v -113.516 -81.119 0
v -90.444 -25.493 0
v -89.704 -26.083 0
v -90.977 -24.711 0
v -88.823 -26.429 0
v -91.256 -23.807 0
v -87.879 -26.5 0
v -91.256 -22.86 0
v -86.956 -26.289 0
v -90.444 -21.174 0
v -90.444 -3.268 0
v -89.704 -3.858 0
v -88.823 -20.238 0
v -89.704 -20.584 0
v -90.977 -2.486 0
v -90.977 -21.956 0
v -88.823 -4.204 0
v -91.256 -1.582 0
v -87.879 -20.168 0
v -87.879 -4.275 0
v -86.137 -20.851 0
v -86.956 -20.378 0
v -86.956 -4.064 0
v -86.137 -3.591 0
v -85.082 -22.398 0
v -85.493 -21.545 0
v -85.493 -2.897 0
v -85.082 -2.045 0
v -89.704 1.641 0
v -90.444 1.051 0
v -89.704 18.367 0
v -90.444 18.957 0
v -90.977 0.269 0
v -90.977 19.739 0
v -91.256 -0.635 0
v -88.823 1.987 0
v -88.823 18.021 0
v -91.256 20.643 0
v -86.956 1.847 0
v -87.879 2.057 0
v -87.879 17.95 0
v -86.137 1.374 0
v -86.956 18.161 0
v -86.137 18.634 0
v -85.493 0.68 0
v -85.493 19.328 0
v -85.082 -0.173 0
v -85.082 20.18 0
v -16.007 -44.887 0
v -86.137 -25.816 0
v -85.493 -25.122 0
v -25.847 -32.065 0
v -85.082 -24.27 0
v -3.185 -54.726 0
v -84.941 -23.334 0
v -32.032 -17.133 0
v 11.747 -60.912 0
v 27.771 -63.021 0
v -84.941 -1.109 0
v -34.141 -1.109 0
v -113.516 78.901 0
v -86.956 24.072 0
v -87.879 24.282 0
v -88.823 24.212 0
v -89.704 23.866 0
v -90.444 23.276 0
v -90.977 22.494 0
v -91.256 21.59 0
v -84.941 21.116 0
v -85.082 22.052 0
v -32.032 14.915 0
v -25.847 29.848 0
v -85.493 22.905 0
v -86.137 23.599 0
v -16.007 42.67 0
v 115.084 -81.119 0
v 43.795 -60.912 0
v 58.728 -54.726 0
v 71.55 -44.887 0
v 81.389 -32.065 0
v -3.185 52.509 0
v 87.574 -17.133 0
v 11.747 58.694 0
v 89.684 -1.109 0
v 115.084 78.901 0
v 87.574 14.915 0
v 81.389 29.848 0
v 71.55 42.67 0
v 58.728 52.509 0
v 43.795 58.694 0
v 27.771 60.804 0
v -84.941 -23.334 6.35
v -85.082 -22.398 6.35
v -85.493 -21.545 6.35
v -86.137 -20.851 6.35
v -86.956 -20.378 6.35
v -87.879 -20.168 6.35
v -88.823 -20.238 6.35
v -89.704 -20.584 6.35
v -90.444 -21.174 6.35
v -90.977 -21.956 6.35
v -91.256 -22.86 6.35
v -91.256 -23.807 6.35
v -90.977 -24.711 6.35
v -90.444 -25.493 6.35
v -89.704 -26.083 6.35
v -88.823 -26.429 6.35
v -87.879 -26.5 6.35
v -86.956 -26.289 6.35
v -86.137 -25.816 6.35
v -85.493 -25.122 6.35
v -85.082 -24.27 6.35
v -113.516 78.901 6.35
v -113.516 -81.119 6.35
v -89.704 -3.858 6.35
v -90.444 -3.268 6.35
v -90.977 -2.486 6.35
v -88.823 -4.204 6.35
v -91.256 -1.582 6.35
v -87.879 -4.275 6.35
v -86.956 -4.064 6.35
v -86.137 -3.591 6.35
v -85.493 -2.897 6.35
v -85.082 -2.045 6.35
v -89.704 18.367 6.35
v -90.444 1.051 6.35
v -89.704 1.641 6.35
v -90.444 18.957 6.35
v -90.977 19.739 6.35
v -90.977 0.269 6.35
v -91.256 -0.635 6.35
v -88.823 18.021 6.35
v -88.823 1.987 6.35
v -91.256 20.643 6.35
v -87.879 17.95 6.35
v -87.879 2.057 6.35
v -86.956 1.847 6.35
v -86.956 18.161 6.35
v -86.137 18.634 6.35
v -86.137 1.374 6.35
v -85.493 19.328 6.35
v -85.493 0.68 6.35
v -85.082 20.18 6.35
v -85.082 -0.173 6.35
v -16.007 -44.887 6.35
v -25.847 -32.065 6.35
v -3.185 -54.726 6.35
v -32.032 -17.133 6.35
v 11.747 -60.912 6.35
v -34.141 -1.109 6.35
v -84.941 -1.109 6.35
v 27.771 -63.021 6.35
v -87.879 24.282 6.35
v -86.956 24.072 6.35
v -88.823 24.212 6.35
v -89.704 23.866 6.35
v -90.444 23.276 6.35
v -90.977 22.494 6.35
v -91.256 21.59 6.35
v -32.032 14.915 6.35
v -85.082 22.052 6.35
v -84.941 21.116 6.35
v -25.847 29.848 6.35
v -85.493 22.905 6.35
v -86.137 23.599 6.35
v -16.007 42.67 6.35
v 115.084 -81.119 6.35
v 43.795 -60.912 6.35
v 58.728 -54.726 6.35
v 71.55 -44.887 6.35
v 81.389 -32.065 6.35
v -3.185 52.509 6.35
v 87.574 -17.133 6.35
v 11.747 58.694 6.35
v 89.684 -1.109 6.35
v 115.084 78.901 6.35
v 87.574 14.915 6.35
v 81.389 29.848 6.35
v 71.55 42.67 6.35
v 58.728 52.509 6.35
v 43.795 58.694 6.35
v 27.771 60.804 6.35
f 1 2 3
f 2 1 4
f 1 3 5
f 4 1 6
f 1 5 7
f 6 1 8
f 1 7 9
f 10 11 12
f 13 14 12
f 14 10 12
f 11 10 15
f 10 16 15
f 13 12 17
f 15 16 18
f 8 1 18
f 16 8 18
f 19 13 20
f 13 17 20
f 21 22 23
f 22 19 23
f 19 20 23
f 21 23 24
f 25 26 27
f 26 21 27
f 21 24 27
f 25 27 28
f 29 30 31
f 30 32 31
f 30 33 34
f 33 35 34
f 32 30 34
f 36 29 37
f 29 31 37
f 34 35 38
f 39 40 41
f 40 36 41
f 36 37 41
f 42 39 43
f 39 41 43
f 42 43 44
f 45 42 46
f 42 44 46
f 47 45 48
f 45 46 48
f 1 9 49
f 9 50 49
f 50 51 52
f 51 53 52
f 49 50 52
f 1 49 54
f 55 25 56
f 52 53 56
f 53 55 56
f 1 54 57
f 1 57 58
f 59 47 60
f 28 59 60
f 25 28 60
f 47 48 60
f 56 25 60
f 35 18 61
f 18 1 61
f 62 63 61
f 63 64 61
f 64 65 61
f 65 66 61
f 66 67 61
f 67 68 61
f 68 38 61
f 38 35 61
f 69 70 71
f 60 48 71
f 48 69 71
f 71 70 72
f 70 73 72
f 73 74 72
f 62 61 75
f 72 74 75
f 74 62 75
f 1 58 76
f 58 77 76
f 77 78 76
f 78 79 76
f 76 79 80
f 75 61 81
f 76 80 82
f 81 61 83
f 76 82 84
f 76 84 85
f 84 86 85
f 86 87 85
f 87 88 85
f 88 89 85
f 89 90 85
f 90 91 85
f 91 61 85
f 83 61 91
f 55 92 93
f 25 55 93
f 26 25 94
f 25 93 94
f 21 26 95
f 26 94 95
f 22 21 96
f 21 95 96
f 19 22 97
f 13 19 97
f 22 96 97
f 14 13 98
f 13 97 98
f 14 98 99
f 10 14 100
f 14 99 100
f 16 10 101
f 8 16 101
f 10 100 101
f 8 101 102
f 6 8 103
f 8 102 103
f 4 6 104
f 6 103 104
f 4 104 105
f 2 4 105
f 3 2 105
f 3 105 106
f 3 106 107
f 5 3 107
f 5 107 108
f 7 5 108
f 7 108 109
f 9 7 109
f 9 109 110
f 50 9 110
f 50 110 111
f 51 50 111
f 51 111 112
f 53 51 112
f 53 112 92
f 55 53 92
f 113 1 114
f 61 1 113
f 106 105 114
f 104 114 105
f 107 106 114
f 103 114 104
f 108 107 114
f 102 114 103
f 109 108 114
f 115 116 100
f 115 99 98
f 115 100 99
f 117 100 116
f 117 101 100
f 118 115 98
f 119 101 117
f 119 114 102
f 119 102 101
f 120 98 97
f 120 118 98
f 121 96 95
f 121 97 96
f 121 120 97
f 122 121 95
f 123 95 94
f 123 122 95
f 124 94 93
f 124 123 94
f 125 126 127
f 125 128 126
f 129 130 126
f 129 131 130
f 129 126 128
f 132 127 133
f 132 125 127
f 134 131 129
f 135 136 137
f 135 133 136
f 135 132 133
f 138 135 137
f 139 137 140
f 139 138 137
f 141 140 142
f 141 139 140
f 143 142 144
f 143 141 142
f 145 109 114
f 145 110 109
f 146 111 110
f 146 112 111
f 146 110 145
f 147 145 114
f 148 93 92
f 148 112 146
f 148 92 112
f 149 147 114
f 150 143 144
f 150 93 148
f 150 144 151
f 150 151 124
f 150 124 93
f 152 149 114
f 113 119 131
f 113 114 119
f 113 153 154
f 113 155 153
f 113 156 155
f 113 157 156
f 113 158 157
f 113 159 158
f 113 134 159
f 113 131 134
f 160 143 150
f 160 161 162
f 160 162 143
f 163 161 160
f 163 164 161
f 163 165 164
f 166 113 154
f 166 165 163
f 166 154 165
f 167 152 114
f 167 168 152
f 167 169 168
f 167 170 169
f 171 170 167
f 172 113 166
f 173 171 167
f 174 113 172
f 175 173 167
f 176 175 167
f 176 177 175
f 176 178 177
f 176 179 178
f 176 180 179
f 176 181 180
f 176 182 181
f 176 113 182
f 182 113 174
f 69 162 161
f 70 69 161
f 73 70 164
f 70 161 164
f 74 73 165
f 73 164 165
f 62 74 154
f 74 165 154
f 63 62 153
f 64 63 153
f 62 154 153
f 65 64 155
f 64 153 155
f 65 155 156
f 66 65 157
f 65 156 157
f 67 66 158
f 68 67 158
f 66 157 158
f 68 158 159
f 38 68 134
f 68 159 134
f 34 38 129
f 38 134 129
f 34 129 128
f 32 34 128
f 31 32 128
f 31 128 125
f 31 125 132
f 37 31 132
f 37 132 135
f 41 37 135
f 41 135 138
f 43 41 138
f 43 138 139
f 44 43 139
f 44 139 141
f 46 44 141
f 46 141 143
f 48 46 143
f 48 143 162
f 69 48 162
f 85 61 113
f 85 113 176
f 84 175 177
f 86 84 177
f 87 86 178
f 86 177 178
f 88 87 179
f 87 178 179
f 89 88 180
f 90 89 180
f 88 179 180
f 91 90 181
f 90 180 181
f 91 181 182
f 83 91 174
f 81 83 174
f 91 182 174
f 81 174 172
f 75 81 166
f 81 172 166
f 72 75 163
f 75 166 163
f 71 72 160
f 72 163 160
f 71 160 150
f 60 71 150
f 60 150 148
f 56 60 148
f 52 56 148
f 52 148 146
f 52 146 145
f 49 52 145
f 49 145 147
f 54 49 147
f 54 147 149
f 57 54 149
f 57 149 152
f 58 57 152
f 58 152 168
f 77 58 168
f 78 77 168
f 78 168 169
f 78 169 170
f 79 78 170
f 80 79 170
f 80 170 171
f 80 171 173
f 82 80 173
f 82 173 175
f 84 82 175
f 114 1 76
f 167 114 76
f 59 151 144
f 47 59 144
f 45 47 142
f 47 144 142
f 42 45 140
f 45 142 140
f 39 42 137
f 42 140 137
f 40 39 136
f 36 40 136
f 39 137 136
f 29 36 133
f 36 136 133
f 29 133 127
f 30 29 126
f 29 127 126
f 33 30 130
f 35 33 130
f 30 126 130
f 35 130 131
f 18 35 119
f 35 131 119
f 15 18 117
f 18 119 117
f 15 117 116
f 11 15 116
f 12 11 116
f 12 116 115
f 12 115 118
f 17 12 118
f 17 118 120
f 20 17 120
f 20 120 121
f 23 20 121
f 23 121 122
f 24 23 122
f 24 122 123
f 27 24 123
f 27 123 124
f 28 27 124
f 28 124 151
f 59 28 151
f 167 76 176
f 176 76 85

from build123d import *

# Parameters (mm, degrees)
F0_W     = 228.6
F0_H     = 160.02
F1_DEPTH = 6.35
F2_R     = 61.9125
F3_DEPTH = 25.4
F4_R     = 3.175
F5_DEPTH = 25.4


with BuildPart() as f1:
    # F0 (on Top) → F1 (new body)
    with BuildSketch(Plane.XY):
        with Locations((0.783786, -1.108692)):
            Rectangle(F0_W, F0_H)
    extrude(amount=F1_DEPTH)

    # F2 (on face) → F3 (cut)
    with BuildSketch(Plane.XY.offset(6.35)):
        with Locations((27.771286, -1.108692)):
            Circle(F2_R)
    extrude(amount=-F3_DEPTH, mode=Mode.SUBTRACT)

    # F4 (on face) → F5 (cut)
    with BuildSketch(Plane.XY.offset(6.35)):
        with Locations((-88.116214, -23.333692)):
            Circle(F4_R)
        with Locations((-88.116214, -1.108692)):
            Circle(F4_R)
        with Locations((-88.116214, 21.116308)):
            Circle(F4_R)
    extrude(amount=-F5_DEPTH, mode=Mode.SUBTRACT)


solid = f1.part
